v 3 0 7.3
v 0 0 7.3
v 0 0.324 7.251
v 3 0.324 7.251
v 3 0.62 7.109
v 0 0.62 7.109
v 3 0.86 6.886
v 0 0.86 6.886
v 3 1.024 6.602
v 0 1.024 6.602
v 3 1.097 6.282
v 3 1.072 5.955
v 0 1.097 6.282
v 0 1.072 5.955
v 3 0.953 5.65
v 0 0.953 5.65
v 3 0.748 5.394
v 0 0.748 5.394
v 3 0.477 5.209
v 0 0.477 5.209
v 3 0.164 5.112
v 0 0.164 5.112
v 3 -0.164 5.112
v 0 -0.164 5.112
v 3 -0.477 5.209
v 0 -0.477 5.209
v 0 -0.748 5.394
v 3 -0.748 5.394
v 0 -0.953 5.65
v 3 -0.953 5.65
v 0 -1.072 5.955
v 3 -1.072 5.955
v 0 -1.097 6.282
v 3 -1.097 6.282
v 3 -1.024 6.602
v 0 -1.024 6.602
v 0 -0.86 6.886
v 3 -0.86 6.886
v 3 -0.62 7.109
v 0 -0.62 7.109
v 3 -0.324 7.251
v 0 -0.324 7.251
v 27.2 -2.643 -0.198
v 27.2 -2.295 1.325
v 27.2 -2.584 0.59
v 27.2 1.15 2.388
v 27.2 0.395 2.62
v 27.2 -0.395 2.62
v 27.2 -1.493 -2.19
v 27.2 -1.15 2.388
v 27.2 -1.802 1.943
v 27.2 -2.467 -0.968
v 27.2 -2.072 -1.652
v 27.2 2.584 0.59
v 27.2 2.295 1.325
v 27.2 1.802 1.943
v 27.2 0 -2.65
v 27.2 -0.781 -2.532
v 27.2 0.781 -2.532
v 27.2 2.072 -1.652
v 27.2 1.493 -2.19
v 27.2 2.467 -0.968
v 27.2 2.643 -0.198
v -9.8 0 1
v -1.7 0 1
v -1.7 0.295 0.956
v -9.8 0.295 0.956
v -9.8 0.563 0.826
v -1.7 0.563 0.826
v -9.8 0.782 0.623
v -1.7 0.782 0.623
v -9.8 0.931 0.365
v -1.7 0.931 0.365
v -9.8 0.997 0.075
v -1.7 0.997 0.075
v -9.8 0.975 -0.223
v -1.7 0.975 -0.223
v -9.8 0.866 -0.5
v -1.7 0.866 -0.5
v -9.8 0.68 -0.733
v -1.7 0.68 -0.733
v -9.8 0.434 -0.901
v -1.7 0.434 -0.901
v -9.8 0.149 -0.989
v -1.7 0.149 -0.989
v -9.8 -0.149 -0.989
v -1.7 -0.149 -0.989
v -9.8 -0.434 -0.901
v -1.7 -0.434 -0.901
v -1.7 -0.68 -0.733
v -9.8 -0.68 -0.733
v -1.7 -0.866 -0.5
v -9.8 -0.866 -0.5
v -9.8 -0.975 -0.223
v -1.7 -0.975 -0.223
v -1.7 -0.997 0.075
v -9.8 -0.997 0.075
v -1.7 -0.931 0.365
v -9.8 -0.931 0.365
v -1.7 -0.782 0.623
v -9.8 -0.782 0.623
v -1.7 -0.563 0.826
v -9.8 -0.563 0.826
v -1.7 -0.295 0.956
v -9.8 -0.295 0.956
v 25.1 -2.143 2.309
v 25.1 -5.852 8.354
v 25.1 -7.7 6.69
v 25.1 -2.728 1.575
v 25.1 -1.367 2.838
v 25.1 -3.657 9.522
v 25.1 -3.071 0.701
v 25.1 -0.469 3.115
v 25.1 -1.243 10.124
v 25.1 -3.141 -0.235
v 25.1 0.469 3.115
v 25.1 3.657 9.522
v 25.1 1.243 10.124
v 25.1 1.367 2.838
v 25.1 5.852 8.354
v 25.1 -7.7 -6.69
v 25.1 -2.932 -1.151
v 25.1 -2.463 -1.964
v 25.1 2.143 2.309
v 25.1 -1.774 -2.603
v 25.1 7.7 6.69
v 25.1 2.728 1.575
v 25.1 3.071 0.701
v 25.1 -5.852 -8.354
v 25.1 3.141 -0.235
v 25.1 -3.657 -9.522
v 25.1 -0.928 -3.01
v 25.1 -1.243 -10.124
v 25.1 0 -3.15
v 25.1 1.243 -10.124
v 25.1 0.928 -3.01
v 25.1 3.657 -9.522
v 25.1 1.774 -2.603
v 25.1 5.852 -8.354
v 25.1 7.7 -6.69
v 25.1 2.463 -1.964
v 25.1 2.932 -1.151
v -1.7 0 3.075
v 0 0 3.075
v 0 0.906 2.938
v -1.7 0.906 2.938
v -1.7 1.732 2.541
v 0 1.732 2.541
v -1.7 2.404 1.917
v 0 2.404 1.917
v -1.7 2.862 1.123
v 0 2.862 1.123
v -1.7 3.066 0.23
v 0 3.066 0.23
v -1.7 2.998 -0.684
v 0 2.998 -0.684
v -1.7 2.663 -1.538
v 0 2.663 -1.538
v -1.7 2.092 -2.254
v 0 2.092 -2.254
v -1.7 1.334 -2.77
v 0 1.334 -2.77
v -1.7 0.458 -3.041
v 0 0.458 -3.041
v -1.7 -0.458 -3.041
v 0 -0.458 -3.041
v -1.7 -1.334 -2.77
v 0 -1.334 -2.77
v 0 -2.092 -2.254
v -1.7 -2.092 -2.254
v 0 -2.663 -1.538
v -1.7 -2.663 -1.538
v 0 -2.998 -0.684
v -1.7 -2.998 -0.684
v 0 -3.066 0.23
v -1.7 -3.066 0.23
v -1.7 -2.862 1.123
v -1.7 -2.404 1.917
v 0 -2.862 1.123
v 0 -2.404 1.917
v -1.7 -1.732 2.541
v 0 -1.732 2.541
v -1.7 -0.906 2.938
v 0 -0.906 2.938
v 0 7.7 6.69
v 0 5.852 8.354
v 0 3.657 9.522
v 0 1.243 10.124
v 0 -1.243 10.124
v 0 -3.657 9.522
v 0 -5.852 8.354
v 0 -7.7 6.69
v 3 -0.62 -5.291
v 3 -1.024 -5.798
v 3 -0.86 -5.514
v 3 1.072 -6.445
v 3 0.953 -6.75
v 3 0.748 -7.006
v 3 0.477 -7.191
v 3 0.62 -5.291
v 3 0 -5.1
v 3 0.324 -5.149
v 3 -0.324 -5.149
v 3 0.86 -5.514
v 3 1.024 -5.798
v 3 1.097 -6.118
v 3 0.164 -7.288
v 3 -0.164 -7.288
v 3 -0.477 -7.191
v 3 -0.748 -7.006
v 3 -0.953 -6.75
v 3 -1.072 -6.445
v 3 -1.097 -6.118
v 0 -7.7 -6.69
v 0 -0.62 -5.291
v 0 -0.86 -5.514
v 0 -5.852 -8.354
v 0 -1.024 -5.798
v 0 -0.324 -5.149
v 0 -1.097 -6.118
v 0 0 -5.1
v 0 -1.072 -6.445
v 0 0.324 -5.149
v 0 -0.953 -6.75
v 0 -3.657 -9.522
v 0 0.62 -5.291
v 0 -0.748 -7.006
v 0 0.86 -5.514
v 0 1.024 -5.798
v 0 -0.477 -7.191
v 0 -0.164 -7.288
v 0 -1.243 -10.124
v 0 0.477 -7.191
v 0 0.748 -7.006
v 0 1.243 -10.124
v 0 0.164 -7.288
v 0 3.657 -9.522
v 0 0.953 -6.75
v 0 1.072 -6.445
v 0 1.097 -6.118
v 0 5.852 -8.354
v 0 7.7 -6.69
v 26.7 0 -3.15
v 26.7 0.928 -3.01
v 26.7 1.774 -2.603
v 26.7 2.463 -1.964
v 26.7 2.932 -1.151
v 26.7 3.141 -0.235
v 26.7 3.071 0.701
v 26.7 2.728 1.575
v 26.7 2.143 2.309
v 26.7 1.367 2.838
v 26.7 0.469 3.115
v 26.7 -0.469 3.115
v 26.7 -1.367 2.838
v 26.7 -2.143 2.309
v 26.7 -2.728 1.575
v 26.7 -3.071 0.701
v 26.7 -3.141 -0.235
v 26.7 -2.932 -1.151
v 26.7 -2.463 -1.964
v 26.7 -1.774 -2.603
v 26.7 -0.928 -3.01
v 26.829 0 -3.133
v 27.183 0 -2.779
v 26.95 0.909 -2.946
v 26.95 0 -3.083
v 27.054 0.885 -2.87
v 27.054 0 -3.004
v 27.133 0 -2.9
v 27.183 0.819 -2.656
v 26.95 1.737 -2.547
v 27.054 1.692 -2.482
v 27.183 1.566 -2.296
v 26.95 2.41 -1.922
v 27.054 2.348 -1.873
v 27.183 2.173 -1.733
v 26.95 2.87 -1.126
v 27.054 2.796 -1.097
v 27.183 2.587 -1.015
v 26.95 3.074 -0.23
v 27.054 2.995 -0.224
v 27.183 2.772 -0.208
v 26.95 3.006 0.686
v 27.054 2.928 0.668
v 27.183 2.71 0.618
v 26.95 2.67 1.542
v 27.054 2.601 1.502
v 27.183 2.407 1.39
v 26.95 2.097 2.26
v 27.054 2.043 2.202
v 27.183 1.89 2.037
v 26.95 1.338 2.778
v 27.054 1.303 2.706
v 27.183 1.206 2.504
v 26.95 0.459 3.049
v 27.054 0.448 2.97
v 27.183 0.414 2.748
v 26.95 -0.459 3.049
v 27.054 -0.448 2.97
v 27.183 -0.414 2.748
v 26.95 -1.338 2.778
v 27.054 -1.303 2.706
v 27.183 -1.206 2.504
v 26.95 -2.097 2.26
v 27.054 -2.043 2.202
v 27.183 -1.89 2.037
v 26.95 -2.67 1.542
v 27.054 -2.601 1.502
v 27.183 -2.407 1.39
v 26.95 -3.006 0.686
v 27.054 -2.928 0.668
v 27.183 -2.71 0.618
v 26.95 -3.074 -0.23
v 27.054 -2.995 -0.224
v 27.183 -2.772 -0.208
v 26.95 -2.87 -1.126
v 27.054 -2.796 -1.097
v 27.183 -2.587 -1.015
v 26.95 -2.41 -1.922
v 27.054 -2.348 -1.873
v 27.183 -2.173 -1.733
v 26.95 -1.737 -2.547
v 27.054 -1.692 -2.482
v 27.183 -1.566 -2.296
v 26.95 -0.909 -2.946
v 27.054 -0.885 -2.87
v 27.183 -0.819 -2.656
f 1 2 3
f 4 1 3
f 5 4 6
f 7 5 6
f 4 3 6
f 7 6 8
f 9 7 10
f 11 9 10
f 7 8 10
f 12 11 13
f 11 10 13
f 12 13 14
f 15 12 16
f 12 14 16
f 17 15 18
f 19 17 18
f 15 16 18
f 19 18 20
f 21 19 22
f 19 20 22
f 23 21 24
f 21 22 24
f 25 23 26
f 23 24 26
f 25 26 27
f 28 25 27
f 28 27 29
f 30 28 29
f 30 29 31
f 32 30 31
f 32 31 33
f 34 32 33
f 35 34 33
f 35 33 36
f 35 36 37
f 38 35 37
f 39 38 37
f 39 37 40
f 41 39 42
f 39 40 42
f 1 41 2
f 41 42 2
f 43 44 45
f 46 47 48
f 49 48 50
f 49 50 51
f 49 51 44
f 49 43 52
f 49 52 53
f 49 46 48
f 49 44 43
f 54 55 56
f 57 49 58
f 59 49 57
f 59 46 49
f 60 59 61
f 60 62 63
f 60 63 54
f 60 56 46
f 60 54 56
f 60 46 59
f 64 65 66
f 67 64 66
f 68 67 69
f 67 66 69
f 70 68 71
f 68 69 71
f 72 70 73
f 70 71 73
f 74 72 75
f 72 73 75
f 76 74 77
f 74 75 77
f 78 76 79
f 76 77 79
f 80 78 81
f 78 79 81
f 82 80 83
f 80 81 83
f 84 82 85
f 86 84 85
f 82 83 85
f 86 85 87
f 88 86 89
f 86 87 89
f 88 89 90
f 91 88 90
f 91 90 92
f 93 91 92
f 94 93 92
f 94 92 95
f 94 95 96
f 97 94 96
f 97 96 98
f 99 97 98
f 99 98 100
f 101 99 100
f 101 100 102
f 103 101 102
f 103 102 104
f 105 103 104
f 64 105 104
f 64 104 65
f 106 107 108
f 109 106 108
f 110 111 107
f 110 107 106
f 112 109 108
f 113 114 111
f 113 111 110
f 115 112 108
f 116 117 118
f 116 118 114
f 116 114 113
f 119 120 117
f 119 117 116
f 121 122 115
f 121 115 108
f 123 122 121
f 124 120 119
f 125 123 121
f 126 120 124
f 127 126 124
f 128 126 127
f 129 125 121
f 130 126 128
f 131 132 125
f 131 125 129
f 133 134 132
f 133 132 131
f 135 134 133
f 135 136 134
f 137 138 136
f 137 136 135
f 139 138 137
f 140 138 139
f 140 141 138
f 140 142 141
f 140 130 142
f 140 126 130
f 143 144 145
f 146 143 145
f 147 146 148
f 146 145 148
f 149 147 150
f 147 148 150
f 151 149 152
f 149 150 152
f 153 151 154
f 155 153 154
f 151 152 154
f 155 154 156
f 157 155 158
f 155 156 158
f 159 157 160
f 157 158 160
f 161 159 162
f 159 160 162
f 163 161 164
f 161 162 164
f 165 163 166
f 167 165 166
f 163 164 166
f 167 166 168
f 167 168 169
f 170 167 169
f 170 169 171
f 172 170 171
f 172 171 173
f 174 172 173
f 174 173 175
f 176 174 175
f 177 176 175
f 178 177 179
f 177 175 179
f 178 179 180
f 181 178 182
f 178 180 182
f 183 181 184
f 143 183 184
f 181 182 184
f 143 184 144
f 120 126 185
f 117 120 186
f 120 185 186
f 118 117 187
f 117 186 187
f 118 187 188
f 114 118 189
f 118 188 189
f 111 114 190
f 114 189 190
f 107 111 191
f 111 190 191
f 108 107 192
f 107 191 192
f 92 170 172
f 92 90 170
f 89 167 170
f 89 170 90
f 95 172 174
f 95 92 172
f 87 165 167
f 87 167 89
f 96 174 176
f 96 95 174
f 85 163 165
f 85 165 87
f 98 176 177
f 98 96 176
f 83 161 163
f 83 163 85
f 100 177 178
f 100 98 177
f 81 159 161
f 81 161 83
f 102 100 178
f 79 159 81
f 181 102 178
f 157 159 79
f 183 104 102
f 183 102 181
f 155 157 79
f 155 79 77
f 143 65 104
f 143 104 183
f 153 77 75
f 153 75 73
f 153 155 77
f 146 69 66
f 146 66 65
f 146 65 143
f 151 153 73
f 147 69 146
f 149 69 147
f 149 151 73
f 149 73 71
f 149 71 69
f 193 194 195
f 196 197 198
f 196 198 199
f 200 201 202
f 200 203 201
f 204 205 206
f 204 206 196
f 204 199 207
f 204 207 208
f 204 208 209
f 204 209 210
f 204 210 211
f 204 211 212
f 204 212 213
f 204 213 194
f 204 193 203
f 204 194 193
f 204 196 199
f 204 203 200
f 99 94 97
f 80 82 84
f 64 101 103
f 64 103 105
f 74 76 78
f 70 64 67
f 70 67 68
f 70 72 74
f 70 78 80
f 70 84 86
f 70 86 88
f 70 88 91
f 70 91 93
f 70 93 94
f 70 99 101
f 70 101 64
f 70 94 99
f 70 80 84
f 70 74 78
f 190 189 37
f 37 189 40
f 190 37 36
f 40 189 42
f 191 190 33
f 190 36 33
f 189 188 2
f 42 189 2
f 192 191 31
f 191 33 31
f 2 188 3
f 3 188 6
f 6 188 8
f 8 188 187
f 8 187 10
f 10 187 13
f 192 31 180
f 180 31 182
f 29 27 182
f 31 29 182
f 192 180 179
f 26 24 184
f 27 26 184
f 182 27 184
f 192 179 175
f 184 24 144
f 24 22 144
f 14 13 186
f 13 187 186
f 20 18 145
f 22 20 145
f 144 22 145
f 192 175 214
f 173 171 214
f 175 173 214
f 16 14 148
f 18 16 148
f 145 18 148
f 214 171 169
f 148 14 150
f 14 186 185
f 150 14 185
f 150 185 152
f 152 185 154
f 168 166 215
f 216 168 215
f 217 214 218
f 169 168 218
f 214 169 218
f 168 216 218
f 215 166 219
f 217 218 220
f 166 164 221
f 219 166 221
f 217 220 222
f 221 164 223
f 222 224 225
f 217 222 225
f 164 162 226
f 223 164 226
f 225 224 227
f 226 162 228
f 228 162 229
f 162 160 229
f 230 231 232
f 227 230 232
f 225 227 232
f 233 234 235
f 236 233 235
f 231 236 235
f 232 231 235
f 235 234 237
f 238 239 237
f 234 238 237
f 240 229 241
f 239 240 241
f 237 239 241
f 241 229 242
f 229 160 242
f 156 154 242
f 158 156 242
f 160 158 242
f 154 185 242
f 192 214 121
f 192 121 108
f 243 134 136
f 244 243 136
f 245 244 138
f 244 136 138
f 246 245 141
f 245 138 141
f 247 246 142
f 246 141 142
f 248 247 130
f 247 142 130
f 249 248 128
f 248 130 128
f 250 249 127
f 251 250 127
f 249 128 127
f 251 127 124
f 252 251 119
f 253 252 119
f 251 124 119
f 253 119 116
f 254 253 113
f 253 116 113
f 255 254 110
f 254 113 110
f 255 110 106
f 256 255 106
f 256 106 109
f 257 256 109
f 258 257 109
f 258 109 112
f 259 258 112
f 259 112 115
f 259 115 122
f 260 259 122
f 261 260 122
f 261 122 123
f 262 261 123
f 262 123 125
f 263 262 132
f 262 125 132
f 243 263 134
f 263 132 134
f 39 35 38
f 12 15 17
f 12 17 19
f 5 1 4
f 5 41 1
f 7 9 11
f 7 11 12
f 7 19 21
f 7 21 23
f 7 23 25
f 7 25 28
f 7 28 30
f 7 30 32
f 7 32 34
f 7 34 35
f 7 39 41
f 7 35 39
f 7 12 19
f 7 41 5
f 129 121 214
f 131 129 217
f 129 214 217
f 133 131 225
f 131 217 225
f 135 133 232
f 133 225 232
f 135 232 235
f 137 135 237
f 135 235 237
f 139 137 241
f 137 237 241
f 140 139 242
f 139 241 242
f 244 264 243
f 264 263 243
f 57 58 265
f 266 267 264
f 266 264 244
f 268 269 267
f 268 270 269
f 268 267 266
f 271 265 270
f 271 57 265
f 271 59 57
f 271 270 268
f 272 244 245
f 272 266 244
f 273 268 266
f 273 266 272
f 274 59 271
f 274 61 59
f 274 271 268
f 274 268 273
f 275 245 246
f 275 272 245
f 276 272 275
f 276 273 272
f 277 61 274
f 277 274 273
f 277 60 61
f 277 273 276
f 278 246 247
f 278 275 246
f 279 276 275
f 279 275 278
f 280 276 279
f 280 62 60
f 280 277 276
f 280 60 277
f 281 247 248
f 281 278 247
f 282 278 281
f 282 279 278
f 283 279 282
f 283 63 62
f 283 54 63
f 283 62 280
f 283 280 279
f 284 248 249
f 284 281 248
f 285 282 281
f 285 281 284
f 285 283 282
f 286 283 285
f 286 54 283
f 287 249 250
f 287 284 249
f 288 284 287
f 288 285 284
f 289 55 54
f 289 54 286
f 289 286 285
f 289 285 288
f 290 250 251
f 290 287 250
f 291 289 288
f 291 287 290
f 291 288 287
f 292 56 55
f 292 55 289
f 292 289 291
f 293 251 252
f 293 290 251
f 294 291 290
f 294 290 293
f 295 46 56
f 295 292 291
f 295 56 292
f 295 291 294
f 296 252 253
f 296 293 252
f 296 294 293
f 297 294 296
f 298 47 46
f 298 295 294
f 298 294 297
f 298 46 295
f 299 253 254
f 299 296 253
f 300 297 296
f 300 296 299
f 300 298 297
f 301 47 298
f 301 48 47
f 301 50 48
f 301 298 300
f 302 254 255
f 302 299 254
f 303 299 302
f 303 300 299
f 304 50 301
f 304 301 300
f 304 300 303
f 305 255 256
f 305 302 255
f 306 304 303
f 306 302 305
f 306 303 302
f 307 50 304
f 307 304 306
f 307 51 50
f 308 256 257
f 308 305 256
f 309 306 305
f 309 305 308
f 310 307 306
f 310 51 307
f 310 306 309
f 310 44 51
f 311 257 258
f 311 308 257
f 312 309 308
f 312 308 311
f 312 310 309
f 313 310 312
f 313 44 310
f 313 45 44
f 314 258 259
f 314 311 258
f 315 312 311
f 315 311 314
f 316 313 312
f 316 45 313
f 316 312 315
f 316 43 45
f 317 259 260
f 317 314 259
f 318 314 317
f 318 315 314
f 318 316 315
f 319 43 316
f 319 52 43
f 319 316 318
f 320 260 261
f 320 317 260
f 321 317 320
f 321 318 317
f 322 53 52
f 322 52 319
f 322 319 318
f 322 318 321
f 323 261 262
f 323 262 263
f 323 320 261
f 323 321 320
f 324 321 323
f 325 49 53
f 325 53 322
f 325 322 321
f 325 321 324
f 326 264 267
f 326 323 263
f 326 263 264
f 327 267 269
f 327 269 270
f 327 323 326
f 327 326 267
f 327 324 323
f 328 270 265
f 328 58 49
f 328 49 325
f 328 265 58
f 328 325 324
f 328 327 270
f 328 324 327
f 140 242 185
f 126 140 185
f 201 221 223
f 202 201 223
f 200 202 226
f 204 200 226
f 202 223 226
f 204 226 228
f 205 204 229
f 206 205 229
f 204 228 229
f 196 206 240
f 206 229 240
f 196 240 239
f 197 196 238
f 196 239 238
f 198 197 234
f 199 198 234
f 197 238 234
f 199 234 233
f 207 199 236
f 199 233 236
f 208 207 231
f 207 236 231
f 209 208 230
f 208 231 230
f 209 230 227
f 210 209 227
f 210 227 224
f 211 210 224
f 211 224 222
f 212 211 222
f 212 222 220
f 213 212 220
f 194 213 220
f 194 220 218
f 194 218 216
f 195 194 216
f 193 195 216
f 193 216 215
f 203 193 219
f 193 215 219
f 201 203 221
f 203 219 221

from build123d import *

# Parameters (mm, degrees)
SKETCH_1_R           = 10.2
EXTRUDE_1_DEPTH      = 25.1
SKETCH_2_OUTSIDE_W   = 30.048
SKETCH_2_OUTSIDE_H   = 30.048
SKETCH_2_OUTSIDE_W_2 = 29.995014986
SKETCH_2_OUTSIDE_H_2 = 15.4
CUT_EXTRUDE_1_DEPTH  = 54.1
SKETCH_3_R           = 3.15
EXTRUDE_2_DEPTH      = 2.1
FILLET_1_R           = 0.5
SKETCH_4_R           = 3.075
EXTRUDE_3_DEPTH      = 1.7
SKETCH_6_R           = 1
EXTRUDE_4_DEPTH      = 9.8
SKETCH_7_R           = 1.1
CUT_EXTRUDE_2_DEPTH  = 3


with BuildPart() as part:
    # 草图1 → 凸台-拉伸1 (new body)
    with BuildSketch(Plane(origin=(0, 0, 0), x_dir=(0, 0, -1), z_dir=(1, 0, 0))):
        Circle(SKETCH_1_R)
    extrude(amount=EXTRUDE_1_DEPTH)

    # 草图2 outside → 切除-拉伸1 (cut)
    with BuildSketch(Plane.ZY):
        Rectangle(SKETCH_2_OUTSIDE_W, SKETCH_2_OUTSIDE_H)
        Rectangle(SKETCH_2_OUTSIDE_W_2, SKETCH_2_OUTSIDE_H_2, mode=Mode.SUBTRACT)
    extrude(amount=-CUT_EXTRUDE_1_DEPTH, mode=Mode.SUBTRACT)

    # 草图3 → 凸台-拉伸2 (add)
    with BuildSketch(Plane(origin=(25.1, 0, 0), x_dir=(0, 0, -1), z_dir=(1, 0, 0))):
        Circle(SKETCH_3_R)
    extrude(amount=EXTRUDE_2_DEPTH)

    # 圆角1
    fillet_1_edges = [part.edges().sort_by_distance(p)[0] for p in [
        (27.2, 0, 3.15),
    ]]
    fillet(fillet_1_edges, radius=FILLET_1_R)

    # 草图4 → 凸台-拉伸3 (add)
    with BuildSketch(Plane.ZY):
        Circle(SKETCH_4_R)
    extrude(amount=EXTRUDE_3_DEPTH)

    # 草图6 → 凸台-拉伸4 (add)
    with BuildSketch(Plane.ZY):
        Circle(SKETCH_6_R)
    extrude(amount=EXTRUDE_4_DEPTH)

    # 草图7 → 切除-拉伸2 (cut)
    with BuildSketch(Plane.ZY):
        with Locations((6.2, 0)):
            Circle(SKETCH_7_R)
        with Locations((-6.2, 0)):
            Circle(SKETCH_7_R)
    extrude(amount=-CUT_EXTRUDE_2_DEPTH, mode=Mode.SUBTRACT)


solid = part.part
